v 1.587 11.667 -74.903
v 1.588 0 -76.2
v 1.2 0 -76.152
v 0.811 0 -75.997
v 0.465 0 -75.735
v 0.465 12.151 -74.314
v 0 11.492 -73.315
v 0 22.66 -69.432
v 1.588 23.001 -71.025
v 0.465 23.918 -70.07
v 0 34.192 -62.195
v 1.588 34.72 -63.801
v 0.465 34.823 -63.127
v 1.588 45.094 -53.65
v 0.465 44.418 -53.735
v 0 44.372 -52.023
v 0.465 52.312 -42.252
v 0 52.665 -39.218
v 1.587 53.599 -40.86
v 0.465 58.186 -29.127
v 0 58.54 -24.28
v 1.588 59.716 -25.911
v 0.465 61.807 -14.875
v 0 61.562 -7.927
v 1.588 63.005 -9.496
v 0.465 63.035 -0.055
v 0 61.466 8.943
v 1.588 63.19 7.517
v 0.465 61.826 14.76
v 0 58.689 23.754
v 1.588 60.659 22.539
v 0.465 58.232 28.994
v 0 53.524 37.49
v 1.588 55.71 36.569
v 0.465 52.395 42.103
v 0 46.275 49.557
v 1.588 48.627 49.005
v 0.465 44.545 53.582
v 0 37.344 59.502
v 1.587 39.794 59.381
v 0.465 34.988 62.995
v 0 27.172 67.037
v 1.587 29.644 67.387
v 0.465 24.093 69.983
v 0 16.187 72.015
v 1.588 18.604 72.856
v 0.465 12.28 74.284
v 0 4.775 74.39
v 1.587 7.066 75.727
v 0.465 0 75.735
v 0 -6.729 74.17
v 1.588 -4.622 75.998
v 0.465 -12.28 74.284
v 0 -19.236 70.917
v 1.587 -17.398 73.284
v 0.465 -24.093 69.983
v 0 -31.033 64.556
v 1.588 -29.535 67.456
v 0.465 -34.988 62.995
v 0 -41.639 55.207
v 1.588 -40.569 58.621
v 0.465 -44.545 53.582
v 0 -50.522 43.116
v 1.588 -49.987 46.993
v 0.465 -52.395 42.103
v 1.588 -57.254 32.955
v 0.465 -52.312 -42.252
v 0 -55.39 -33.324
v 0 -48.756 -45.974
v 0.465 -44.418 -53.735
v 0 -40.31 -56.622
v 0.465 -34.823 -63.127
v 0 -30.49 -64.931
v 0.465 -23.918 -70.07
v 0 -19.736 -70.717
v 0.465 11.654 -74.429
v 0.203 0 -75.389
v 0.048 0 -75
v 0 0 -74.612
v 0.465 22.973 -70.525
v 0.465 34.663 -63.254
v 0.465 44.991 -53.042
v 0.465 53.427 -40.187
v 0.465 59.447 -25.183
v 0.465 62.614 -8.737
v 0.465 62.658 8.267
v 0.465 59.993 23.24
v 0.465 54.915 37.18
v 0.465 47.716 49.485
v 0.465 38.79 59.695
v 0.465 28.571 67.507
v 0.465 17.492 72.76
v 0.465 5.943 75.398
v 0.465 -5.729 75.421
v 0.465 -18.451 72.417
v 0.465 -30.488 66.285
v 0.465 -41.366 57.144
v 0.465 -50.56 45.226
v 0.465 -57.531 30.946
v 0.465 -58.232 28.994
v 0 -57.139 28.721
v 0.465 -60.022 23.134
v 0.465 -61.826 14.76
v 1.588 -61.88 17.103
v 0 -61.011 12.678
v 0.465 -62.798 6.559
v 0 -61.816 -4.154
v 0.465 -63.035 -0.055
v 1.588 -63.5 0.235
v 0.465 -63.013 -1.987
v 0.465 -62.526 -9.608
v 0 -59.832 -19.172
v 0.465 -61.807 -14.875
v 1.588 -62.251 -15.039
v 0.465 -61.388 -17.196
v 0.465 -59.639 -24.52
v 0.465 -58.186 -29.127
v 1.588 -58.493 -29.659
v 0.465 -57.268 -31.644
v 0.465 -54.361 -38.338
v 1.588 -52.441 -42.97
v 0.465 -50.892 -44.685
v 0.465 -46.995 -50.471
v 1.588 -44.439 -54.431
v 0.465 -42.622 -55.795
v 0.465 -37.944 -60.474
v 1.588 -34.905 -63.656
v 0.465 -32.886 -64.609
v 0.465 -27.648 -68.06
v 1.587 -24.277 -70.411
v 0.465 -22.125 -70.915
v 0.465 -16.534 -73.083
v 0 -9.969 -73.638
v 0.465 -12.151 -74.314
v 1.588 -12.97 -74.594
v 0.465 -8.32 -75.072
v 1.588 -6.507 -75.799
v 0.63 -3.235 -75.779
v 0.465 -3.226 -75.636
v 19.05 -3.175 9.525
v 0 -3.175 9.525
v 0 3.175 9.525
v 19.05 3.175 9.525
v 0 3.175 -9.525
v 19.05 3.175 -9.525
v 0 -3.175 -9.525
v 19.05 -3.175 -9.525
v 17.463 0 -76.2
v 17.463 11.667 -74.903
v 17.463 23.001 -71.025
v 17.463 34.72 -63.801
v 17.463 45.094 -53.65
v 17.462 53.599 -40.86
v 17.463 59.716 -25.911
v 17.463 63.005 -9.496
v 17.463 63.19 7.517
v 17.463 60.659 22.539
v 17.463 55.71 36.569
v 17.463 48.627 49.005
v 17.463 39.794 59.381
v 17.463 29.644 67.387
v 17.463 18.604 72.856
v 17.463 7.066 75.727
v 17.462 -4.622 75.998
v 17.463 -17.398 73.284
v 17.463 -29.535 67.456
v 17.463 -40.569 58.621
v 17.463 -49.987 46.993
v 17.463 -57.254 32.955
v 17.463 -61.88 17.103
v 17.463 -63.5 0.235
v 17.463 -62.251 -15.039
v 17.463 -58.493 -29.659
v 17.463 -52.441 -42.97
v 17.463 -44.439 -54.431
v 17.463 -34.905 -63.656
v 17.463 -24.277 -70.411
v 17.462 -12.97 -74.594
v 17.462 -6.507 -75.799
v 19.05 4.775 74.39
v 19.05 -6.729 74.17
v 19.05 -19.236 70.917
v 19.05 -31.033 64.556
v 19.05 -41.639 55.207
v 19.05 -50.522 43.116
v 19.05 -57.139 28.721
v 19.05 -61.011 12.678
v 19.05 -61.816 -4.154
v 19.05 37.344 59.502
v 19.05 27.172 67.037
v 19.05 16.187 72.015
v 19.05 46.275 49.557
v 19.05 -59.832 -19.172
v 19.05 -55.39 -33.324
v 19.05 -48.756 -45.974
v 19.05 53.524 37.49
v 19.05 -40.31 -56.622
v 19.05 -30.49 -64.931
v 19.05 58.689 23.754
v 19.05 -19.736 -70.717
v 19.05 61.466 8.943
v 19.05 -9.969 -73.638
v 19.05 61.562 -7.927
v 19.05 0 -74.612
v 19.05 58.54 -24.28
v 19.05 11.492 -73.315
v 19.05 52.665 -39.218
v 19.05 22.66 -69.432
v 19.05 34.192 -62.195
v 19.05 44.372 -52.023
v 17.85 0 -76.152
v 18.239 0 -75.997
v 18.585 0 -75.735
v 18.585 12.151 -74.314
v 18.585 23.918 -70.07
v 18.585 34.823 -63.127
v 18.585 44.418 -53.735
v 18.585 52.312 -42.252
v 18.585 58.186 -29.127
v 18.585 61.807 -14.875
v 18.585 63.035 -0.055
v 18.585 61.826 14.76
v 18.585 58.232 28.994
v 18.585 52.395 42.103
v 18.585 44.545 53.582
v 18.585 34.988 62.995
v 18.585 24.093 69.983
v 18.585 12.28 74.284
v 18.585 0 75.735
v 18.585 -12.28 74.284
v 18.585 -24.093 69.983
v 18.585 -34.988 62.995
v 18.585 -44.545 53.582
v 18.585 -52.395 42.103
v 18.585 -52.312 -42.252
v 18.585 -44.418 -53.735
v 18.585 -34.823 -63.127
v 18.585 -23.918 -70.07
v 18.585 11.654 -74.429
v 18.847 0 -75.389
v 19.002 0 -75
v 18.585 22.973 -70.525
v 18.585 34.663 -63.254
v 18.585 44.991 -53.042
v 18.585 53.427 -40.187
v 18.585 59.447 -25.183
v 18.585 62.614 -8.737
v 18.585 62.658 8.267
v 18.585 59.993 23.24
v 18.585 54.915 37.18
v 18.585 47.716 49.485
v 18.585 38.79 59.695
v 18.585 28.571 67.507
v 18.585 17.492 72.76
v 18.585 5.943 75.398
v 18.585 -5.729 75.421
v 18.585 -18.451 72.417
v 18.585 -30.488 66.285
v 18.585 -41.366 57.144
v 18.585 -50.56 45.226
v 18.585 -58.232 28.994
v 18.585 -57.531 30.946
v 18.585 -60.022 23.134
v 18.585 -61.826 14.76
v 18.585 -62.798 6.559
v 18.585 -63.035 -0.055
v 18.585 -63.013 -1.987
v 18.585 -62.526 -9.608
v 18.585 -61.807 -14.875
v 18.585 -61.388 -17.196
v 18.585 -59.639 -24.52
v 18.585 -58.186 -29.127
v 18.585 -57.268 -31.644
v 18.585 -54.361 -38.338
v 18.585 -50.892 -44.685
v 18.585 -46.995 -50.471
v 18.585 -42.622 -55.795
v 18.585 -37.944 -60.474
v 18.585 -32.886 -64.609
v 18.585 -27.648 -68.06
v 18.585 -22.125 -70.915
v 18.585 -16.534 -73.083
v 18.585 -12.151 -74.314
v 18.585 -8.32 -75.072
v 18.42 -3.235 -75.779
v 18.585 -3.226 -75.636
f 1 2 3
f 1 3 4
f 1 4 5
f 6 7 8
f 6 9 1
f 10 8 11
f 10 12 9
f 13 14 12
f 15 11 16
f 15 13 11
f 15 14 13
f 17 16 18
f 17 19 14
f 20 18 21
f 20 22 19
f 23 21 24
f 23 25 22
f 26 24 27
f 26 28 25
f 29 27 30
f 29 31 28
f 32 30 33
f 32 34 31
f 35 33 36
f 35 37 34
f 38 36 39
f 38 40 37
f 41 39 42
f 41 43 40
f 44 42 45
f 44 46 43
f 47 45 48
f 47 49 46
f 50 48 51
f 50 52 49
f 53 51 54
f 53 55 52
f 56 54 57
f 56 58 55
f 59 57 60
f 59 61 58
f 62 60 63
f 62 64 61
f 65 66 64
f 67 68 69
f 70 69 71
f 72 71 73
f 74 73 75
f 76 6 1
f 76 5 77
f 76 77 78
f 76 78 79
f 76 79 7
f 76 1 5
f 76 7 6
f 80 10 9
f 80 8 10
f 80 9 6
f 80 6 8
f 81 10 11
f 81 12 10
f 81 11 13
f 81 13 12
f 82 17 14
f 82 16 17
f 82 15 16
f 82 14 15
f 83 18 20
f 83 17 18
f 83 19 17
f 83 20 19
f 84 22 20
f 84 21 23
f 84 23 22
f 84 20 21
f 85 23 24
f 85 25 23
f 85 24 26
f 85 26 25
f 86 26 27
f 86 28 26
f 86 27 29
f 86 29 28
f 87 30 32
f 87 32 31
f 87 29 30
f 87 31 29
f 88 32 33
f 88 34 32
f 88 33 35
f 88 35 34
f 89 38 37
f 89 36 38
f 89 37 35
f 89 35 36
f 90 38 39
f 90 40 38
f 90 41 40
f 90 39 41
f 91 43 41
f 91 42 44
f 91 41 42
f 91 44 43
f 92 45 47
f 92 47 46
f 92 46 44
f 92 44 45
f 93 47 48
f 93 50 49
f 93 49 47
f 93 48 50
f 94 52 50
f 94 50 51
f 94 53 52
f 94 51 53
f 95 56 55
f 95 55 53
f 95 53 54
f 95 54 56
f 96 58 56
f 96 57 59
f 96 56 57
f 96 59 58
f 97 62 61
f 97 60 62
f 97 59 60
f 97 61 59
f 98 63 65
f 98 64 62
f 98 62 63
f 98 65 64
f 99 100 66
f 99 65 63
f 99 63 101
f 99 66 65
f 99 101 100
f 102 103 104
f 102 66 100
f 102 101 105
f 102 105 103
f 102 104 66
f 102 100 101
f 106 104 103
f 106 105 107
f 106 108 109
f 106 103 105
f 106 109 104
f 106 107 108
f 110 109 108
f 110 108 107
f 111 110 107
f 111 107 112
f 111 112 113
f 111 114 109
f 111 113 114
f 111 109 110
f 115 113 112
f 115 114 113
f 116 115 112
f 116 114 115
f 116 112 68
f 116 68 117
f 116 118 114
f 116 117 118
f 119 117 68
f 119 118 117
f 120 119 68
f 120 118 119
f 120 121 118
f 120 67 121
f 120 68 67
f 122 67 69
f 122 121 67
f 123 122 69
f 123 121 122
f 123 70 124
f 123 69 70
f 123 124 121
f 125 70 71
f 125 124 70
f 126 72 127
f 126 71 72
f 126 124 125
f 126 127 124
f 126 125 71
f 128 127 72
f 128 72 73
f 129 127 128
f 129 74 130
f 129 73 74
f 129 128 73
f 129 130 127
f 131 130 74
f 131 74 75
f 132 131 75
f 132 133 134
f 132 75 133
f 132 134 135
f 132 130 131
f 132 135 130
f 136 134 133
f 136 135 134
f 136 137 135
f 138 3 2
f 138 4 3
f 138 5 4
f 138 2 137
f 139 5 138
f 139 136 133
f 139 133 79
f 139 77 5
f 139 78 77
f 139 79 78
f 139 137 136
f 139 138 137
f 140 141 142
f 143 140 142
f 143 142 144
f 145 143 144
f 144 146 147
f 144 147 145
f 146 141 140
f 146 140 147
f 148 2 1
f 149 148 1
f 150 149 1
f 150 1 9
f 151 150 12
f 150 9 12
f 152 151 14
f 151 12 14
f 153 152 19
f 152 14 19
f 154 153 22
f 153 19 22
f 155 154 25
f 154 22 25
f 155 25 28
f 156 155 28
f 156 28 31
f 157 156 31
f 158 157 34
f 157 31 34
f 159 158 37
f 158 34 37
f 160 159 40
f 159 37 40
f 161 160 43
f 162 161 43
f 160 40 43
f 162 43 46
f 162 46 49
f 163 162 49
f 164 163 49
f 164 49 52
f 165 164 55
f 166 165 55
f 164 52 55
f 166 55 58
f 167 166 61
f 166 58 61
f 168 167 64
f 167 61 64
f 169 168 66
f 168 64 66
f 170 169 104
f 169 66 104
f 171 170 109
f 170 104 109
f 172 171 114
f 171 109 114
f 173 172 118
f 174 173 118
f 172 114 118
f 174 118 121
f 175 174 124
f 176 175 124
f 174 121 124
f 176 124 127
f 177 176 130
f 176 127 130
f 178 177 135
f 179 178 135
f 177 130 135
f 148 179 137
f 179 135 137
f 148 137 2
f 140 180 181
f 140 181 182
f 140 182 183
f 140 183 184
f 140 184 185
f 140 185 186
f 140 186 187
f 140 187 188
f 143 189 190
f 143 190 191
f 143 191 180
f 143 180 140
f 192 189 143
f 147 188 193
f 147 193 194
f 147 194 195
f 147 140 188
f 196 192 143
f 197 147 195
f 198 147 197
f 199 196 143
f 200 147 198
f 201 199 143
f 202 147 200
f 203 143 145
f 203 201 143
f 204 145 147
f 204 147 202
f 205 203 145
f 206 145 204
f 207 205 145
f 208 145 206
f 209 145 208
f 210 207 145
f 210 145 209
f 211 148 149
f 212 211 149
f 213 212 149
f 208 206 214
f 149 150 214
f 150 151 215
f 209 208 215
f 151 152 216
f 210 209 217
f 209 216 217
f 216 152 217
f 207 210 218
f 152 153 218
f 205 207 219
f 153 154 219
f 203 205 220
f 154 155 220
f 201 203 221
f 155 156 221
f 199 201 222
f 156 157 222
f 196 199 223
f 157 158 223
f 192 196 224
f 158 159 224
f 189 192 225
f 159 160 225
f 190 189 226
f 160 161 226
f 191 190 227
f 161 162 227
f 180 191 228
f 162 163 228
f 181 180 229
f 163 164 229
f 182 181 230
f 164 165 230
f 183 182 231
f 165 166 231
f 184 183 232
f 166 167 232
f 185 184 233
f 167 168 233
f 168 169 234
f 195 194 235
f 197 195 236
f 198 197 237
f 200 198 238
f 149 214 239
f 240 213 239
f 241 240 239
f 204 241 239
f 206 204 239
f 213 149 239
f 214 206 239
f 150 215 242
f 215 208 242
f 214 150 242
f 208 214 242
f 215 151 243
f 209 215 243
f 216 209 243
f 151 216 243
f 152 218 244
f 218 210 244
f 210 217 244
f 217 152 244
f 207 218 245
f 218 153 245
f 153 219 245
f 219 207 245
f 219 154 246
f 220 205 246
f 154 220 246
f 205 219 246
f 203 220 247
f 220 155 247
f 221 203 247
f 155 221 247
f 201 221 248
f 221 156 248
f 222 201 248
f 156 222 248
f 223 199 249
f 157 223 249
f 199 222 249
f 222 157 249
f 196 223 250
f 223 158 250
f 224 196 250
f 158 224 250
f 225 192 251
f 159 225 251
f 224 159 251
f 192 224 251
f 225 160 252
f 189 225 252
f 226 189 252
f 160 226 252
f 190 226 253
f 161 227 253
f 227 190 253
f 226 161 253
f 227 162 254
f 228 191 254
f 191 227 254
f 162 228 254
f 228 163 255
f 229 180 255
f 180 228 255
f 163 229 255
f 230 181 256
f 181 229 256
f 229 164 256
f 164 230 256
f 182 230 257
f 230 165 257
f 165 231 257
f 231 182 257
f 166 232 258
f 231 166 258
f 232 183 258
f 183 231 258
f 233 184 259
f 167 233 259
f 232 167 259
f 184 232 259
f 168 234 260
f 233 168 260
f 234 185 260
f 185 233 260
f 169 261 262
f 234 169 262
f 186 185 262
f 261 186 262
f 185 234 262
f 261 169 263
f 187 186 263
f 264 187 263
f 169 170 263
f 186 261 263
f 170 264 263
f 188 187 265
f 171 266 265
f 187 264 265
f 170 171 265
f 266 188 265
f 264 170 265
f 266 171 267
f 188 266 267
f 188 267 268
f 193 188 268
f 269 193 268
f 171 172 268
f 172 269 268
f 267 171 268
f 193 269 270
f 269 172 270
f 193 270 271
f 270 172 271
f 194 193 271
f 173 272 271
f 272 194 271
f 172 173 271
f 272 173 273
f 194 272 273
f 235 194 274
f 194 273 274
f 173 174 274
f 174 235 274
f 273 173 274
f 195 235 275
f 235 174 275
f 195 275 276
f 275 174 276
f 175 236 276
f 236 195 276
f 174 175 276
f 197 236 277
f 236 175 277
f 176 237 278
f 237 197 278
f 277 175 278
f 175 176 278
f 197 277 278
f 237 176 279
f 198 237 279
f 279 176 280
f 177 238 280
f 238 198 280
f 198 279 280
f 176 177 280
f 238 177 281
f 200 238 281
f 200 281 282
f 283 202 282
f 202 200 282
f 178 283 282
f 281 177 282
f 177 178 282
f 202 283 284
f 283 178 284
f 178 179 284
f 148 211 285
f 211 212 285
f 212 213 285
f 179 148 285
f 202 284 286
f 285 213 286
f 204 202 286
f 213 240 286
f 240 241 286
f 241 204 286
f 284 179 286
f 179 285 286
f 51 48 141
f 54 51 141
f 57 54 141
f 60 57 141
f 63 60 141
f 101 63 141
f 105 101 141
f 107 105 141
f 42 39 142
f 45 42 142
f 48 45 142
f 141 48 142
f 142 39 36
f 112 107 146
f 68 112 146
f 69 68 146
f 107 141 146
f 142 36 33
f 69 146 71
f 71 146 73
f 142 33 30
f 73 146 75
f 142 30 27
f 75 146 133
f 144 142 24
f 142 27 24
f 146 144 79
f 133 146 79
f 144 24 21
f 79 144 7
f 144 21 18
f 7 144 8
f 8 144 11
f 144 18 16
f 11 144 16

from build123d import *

# Parameters (mm, degrees)
SKETCH1_RX          = 76.2
SKETCH1_RY          = 63.5
SKETCH1_W           = 19.05
SKETCH1_H           = 6.35
BOSS_EXTRUDE1_DEPTH = 19.05
FILLET1_R           = 1.5875


with BuildPart() as part:
    # Sketch1 → Boss-Extrude1 (new body)
    with BuildSketch(Plane(origin=(0, 0, 0), x_dir=(0, 0, -1), z_dir=(1, 0, 0))):
        with Locations((0, 0)):
            Ellipse(SKETCH1_RX, SKETCH1_RY)
        Rectangle(SKETCH1_W, SKETCH1_H, mode=Mode.SUBTRACT)
    extrude(amount=BOSS_EXTRUDE1_DEPTH)

    # Fillet1
    fillet1_edges = [part.edges().sort_by_distance(p)[0] for p in [
        (0, -0.005294399, 76.199999735),
        (19.05, -0.005294399, 76.199999735),
    ]]
    fillet(fillet1_edges, radius=FILLET1_R)


solid = part.part
